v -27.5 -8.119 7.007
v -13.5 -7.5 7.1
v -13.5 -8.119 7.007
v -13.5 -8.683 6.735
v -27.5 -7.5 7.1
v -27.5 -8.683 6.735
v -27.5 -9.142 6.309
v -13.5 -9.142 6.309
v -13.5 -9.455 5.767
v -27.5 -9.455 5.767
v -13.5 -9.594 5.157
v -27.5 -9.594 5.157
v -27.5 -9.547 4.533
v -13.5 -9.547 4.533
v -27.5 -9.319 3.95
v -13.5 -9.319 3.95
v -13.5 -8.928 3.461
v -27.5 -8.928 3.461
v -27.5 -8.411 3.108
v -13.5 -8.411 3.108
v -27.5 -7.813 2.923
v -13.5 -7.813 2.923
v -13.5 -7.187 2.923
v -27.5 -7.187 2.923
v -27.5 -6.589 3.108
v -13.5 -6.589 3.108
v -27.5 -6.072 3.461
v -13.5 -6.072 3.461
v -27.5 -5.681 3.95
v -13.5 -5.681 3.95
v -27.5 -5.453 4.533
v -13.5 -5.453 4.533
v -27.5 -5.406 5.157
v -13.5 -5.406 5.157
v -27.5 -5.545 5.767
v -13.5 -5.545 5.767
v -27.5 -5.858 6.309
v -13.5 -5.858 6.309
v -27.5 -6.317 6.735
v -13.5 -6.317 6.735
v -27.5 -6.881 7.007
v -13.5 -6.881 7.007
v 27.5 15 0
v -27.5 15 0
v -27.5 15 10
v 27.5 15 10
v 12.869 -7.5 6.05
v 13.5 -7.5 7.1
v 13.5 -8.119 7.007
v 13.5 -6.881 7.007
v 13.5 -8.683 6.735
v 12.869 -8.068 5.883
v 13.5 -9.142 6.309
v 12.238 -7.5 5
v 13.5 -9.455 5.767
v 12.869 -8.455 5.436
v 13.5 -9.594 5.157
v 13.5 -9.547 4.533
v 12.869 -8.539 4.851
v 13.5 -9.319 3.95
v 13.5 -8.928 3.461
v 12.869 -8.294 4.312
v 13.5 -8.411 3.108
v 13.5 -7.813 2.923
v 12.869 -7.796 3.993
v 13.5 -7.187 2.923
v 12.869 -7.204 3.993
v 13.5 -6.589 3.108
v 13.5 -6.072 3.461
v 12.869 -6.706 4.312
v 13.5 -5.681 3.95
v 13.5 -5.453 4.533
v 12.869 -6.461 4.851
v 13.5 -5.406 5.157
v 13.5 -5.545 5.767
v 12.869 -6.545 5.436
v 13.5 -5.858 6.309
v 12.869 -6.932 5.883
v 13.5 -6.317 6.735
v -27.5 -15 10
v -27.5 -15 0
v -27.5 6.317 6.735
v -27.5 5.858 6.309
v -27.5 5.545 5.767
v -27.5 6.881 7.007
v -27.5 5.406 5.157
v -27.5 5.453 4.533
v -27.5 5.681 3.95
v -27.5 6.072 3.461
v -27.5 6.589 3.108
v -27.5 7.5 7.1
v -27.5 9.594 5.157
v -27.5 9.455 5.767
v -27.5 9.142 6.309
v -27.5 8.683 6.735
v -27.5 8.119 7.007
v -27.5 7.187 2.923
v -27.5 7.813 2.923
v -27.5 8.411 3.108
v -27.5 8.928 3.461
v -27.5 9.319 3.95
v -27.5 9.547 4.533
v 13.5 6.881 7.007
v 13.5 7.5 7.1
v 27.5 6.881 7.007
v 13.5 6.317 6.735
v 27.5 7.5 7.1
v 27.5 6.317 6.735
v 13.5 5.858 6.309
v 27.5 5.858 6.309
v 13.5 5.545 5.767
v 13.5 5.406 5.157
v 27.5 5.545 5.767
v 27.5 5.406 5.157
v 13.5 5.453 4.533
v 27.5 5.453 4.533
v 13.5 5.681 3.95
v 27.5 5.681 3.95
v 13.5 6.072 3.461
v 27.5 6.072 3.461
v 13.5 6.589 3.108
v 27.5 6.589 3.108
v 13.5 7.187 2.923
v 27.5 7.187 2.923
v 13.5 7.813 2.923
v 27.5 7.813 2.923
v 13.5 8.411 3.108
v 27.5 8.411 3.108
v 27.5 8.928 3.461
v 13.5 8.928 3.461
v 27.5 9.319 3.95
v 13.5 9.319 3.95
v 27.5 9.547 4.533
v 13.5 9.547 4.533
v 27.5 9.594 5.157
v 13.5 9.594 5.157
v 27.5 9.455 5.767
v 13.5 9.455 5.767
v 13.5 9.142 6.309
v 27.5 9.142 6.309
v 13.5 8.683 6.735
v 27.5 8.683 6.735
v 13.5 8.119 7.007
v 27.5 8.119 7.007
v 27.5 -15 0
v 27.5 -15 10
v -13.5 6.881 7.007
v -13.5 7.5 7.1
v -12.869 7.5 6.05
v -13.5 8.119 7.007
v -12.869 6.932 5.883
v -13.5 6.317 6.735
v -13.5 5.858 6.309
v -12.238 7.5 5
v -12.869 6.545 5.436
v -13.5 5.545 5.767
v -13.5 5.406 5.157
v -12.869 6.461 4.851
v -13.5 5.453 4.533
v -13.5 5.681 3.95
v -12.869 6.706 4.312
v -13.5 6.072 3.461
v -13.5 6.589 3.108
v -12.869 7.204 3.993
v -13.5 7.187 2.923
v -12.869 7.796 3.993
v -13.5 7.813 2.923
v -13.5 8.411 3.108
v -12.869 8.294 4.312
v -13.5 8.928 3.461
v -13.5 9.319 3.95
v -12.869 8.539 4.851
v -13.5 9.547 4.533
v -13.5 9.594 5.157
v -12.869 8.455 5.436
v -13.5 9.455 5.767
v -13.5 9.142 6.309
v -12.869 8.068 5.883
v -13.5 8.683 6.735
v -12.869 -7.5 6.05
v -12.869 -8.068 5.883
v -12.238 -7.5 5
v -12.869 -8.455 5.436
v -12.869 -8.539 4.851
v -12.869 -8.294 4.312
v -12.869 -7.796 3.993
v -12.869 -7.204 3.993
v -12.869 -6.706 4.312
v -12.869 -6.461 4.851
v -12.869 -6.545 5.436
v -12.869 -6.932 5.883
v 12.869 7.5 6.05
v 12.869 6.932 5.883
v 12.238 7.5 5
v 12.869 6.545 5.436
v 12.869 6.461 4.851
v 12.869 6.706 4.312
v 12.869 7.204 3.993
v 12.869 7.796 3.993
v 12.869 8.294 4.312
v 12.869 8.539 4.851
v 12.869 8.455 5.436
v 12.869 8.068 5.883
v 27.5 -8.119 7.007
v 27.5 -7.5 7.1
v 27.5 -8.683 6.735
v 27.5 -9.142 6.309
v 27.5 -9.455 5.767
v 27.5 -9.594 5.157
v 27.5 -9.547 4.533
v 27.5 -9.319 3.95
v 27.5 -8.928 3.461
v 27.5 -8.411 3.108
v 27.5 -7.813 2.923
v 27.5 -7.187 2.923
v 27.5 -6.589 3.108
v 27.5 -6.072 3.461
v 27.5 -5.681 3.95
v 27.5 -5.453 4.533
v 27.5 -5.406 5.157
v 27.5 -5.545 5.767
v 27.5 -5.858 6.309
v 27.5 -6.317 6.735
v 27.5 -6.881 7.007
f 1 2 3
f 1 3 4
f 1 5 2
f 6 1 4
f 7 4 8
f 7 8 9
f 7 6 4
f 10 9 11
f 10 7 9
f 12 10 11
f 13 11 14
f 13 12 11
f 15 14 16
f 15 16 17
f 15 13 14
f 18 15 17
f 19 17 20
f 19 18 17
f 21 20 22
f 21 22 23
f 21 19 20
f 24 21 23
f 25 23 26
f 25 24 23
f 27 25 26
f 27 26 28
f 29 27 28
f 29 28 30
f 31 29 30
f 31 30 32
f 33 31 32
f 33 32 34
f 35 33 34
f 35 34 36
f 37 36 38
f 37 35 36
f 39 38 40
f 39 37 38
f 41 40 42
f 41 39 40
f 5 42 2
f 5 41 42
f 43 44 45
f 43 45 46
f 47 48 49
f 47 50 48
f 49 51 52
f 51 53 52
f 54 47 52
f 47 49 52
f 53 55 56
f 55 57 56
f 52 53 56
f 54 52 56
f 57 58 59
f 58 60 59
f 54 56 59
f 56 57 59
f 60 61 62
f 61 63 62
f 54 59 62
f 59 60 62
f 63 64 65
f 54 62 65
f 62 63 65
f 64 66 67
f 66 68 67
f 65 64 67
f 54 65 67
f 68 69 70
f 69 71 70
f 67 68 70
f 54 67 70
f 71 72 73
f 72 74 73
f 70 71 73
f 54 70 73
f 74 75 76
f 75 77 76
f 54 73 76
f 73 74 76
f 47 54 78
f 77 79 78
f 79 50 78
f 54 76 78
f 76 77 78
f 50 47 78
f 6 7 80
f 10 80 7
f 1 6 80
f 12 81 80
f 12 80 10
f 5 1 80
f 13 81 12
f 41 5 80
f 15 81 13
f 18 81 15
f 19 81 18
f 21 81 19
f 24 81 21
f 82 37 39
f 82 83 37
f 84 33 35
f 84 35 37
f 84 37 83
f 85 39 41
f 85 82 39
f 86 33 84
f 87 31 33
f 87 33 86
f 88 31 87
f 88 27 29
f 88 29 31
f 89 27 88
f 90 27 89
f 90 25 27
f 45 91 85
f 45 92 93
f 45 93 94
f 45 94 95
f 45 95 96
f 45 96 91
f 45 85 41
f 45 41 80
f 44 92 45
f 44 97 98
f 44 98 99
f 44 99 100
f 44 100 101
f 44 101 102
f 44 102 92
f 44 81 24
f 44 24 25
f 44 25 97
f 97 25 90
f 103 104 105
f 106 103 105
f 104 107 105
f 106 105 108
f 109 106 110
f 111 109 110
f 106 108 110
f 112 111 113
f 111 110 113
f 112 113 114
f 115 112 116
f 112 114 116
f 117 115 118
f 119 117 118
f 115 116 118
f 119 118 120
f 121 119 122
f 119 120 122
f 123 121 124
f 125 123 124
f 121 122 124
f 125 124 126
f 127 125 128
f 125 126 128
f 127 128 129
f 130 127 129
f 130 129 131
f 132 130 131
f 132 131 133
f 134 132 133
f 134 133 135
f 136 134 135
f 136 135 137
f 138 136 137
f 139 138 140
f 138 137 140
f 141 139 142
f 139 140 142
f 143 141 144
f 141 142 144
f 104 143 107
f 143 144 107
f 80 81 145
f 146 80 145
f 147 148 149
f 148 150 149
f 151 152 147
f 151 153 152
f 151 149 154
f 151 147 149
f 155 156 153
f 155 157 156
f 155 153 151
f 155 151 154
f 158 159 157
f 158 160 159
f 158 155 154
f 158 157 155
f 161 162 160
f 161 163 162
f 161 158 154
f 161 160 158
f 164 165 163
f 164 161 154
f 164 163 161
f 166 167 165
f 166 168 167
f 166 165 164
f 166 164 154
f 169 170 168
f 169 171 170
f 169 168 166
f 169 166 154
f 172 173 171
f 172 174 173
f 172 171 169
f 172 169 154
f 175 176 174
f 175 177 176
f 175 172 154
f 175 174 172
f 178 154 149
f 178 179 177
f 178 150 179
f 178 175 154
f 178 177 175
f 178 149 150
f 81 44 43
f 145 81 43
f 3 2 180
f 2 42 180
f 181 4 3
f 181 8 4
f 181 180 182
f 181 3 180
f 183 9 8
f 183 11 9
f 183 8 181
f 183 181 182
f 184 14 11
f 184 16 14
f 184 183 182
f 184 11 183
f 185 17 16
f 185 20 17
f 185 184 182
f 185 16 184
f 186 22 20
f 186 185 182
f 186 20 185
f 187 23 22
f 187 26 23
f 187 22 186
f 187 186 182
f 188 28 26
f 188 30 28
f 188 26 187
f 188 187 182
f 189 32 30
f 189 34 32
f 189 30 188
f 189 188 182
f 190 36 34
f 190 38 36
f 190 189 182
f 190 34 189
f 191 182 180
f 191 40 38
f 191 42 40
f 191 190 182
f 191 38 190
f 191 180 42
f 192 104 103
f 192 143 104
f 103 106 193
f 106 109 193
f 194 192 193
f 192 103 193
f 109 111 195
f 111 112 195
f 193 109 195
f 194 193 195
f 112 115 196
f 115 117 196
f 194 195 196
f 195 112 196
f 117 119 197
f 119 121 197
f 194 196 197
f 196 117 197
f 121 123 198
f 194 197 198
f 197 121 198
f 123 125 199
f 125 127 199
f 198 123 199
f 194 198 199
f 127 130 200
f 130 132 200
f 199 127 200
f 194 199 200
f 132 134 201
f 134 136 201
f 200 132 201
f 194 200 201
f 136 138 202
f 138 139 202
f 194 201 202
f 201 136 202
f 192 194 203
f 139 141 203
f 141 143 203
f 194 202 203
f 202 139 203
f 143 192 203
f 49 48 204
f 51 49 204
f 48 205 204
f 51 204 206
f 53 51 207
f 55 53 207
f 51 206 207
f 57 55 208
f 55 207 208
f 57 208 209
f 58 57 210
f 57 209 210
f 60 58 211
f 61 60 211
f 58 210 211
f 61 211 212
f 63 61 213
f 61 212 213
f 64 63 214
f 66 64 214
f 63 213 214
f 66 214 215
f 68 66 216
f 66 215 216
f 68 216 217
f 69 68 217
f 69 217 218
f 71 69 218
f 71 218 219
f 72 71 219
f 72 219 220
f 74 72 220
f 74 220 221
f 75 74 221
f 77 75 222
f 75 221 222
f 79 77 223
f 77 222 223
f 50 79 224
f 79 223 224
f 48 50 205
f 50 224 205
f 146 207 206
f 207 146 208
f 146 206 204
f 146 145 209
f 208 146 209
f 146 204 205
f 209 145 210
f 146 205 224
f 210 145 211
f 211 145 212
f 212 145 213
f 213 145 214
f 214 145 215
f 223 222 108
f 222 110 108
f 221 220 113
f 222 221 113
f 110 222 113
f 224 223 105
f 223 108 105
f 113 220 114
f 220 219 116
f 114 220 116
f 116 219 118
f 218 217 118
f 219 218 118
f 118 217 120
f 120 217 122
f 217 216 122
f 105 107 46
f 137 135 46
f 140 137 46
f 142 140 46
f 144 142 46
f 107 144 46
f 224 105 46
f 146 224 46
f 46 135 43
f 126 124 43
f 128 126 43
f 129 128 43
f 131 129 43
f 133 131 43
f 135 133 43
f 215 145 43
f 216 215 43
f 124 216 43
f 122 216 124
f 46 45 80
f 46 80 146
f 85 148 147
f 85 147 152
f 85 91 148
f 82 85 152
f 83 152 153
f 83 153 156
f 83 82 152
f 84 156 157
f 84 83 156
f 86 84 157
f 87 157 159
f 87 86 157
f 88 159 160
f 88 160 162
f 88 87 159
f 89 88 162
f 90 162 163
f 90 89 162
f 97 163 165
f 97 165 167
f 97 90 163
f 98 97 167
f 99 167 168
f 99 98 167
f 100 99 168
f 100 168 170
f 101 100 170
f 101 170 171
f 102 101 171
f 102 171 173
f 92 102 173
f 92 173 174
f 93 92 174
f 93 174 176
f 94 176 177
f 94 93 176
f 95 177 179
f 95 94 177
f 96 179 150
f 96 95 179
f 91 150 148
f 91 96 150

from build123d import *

# Parameters (mm, degrees)
SKETCH1_W                  = 55
SKETCH1_H                  = 30
BOSS_EXTRUDE1_DEPTH        = 10
M5_TAPPED_HOLE1_AT_2_COUNT = 2
M5_TAPPED_HOLE1_AT_2_PITCH = 15


with BuildPart() as part:
    # Sketch1 → Boss-Extrude1 (new body)
    with BuildSketch(Plane.XY):
        Rectangle(SKETCH1_W, SKETCH1_H)
    extrude(amount=BOSS_EXTRUDE1_DEPTH)

    # Sketch3 → M5 Tapped Hole1 (revolve, cut)
    with BuildSketch(Plane(origin=(-27.5, 7.5, 5), x_dir=(0, 0, 1), z_dir=(0, 1, 0))):
        Polygon((0, 0), (0, 15.2618073), (2.1, 14), (2.1, 0), align=None)
    m5_tapped_hole1 = revolve(axis=Axis((-33.85, 7.5, 5), (1, 0, 0)), mode=Mode.SUBTRACT)

    # M5 Tapped Hole1 at 2: M5 Tapped Hole1 ×2
    with Locations(*[(0, -i * M5_TAPPED_HOLE1_AT_2_PITCH, 0) for i in range(1, M5_TAPPED_HOLE1_AT_2_COUNT)]):
        add(m5_tapped_hole1, mode=Mode.SUBTRACT)

    # Mirror1: M5 Tapped Hole1 across plane
    add(m5_tapped_hole1.mirror(Plane(origin=(0, 0, 0), x_dir=(0, 0, 1), z_dir=(1, 0, 0))), mode=Mode.SUBTRACT)

    # Mirror1 copy 1 sketch → Mirror1 copy 1 (revolve, cut)
    with BuildSketch(Plane(origin=(27.5, -7.5, 5), x_dir=(0, 0, 1), z_dir=(0, 1, 0))):
        Polygon((0, 0), (0, -15.2618073), (2.1, -14), (2.1, 0), align=None)
    revolve(axis=Axis((33.85, -7.5, 5), (1, 0, 0)), mode=Mode.SUBTRACT)


solid = part.part
